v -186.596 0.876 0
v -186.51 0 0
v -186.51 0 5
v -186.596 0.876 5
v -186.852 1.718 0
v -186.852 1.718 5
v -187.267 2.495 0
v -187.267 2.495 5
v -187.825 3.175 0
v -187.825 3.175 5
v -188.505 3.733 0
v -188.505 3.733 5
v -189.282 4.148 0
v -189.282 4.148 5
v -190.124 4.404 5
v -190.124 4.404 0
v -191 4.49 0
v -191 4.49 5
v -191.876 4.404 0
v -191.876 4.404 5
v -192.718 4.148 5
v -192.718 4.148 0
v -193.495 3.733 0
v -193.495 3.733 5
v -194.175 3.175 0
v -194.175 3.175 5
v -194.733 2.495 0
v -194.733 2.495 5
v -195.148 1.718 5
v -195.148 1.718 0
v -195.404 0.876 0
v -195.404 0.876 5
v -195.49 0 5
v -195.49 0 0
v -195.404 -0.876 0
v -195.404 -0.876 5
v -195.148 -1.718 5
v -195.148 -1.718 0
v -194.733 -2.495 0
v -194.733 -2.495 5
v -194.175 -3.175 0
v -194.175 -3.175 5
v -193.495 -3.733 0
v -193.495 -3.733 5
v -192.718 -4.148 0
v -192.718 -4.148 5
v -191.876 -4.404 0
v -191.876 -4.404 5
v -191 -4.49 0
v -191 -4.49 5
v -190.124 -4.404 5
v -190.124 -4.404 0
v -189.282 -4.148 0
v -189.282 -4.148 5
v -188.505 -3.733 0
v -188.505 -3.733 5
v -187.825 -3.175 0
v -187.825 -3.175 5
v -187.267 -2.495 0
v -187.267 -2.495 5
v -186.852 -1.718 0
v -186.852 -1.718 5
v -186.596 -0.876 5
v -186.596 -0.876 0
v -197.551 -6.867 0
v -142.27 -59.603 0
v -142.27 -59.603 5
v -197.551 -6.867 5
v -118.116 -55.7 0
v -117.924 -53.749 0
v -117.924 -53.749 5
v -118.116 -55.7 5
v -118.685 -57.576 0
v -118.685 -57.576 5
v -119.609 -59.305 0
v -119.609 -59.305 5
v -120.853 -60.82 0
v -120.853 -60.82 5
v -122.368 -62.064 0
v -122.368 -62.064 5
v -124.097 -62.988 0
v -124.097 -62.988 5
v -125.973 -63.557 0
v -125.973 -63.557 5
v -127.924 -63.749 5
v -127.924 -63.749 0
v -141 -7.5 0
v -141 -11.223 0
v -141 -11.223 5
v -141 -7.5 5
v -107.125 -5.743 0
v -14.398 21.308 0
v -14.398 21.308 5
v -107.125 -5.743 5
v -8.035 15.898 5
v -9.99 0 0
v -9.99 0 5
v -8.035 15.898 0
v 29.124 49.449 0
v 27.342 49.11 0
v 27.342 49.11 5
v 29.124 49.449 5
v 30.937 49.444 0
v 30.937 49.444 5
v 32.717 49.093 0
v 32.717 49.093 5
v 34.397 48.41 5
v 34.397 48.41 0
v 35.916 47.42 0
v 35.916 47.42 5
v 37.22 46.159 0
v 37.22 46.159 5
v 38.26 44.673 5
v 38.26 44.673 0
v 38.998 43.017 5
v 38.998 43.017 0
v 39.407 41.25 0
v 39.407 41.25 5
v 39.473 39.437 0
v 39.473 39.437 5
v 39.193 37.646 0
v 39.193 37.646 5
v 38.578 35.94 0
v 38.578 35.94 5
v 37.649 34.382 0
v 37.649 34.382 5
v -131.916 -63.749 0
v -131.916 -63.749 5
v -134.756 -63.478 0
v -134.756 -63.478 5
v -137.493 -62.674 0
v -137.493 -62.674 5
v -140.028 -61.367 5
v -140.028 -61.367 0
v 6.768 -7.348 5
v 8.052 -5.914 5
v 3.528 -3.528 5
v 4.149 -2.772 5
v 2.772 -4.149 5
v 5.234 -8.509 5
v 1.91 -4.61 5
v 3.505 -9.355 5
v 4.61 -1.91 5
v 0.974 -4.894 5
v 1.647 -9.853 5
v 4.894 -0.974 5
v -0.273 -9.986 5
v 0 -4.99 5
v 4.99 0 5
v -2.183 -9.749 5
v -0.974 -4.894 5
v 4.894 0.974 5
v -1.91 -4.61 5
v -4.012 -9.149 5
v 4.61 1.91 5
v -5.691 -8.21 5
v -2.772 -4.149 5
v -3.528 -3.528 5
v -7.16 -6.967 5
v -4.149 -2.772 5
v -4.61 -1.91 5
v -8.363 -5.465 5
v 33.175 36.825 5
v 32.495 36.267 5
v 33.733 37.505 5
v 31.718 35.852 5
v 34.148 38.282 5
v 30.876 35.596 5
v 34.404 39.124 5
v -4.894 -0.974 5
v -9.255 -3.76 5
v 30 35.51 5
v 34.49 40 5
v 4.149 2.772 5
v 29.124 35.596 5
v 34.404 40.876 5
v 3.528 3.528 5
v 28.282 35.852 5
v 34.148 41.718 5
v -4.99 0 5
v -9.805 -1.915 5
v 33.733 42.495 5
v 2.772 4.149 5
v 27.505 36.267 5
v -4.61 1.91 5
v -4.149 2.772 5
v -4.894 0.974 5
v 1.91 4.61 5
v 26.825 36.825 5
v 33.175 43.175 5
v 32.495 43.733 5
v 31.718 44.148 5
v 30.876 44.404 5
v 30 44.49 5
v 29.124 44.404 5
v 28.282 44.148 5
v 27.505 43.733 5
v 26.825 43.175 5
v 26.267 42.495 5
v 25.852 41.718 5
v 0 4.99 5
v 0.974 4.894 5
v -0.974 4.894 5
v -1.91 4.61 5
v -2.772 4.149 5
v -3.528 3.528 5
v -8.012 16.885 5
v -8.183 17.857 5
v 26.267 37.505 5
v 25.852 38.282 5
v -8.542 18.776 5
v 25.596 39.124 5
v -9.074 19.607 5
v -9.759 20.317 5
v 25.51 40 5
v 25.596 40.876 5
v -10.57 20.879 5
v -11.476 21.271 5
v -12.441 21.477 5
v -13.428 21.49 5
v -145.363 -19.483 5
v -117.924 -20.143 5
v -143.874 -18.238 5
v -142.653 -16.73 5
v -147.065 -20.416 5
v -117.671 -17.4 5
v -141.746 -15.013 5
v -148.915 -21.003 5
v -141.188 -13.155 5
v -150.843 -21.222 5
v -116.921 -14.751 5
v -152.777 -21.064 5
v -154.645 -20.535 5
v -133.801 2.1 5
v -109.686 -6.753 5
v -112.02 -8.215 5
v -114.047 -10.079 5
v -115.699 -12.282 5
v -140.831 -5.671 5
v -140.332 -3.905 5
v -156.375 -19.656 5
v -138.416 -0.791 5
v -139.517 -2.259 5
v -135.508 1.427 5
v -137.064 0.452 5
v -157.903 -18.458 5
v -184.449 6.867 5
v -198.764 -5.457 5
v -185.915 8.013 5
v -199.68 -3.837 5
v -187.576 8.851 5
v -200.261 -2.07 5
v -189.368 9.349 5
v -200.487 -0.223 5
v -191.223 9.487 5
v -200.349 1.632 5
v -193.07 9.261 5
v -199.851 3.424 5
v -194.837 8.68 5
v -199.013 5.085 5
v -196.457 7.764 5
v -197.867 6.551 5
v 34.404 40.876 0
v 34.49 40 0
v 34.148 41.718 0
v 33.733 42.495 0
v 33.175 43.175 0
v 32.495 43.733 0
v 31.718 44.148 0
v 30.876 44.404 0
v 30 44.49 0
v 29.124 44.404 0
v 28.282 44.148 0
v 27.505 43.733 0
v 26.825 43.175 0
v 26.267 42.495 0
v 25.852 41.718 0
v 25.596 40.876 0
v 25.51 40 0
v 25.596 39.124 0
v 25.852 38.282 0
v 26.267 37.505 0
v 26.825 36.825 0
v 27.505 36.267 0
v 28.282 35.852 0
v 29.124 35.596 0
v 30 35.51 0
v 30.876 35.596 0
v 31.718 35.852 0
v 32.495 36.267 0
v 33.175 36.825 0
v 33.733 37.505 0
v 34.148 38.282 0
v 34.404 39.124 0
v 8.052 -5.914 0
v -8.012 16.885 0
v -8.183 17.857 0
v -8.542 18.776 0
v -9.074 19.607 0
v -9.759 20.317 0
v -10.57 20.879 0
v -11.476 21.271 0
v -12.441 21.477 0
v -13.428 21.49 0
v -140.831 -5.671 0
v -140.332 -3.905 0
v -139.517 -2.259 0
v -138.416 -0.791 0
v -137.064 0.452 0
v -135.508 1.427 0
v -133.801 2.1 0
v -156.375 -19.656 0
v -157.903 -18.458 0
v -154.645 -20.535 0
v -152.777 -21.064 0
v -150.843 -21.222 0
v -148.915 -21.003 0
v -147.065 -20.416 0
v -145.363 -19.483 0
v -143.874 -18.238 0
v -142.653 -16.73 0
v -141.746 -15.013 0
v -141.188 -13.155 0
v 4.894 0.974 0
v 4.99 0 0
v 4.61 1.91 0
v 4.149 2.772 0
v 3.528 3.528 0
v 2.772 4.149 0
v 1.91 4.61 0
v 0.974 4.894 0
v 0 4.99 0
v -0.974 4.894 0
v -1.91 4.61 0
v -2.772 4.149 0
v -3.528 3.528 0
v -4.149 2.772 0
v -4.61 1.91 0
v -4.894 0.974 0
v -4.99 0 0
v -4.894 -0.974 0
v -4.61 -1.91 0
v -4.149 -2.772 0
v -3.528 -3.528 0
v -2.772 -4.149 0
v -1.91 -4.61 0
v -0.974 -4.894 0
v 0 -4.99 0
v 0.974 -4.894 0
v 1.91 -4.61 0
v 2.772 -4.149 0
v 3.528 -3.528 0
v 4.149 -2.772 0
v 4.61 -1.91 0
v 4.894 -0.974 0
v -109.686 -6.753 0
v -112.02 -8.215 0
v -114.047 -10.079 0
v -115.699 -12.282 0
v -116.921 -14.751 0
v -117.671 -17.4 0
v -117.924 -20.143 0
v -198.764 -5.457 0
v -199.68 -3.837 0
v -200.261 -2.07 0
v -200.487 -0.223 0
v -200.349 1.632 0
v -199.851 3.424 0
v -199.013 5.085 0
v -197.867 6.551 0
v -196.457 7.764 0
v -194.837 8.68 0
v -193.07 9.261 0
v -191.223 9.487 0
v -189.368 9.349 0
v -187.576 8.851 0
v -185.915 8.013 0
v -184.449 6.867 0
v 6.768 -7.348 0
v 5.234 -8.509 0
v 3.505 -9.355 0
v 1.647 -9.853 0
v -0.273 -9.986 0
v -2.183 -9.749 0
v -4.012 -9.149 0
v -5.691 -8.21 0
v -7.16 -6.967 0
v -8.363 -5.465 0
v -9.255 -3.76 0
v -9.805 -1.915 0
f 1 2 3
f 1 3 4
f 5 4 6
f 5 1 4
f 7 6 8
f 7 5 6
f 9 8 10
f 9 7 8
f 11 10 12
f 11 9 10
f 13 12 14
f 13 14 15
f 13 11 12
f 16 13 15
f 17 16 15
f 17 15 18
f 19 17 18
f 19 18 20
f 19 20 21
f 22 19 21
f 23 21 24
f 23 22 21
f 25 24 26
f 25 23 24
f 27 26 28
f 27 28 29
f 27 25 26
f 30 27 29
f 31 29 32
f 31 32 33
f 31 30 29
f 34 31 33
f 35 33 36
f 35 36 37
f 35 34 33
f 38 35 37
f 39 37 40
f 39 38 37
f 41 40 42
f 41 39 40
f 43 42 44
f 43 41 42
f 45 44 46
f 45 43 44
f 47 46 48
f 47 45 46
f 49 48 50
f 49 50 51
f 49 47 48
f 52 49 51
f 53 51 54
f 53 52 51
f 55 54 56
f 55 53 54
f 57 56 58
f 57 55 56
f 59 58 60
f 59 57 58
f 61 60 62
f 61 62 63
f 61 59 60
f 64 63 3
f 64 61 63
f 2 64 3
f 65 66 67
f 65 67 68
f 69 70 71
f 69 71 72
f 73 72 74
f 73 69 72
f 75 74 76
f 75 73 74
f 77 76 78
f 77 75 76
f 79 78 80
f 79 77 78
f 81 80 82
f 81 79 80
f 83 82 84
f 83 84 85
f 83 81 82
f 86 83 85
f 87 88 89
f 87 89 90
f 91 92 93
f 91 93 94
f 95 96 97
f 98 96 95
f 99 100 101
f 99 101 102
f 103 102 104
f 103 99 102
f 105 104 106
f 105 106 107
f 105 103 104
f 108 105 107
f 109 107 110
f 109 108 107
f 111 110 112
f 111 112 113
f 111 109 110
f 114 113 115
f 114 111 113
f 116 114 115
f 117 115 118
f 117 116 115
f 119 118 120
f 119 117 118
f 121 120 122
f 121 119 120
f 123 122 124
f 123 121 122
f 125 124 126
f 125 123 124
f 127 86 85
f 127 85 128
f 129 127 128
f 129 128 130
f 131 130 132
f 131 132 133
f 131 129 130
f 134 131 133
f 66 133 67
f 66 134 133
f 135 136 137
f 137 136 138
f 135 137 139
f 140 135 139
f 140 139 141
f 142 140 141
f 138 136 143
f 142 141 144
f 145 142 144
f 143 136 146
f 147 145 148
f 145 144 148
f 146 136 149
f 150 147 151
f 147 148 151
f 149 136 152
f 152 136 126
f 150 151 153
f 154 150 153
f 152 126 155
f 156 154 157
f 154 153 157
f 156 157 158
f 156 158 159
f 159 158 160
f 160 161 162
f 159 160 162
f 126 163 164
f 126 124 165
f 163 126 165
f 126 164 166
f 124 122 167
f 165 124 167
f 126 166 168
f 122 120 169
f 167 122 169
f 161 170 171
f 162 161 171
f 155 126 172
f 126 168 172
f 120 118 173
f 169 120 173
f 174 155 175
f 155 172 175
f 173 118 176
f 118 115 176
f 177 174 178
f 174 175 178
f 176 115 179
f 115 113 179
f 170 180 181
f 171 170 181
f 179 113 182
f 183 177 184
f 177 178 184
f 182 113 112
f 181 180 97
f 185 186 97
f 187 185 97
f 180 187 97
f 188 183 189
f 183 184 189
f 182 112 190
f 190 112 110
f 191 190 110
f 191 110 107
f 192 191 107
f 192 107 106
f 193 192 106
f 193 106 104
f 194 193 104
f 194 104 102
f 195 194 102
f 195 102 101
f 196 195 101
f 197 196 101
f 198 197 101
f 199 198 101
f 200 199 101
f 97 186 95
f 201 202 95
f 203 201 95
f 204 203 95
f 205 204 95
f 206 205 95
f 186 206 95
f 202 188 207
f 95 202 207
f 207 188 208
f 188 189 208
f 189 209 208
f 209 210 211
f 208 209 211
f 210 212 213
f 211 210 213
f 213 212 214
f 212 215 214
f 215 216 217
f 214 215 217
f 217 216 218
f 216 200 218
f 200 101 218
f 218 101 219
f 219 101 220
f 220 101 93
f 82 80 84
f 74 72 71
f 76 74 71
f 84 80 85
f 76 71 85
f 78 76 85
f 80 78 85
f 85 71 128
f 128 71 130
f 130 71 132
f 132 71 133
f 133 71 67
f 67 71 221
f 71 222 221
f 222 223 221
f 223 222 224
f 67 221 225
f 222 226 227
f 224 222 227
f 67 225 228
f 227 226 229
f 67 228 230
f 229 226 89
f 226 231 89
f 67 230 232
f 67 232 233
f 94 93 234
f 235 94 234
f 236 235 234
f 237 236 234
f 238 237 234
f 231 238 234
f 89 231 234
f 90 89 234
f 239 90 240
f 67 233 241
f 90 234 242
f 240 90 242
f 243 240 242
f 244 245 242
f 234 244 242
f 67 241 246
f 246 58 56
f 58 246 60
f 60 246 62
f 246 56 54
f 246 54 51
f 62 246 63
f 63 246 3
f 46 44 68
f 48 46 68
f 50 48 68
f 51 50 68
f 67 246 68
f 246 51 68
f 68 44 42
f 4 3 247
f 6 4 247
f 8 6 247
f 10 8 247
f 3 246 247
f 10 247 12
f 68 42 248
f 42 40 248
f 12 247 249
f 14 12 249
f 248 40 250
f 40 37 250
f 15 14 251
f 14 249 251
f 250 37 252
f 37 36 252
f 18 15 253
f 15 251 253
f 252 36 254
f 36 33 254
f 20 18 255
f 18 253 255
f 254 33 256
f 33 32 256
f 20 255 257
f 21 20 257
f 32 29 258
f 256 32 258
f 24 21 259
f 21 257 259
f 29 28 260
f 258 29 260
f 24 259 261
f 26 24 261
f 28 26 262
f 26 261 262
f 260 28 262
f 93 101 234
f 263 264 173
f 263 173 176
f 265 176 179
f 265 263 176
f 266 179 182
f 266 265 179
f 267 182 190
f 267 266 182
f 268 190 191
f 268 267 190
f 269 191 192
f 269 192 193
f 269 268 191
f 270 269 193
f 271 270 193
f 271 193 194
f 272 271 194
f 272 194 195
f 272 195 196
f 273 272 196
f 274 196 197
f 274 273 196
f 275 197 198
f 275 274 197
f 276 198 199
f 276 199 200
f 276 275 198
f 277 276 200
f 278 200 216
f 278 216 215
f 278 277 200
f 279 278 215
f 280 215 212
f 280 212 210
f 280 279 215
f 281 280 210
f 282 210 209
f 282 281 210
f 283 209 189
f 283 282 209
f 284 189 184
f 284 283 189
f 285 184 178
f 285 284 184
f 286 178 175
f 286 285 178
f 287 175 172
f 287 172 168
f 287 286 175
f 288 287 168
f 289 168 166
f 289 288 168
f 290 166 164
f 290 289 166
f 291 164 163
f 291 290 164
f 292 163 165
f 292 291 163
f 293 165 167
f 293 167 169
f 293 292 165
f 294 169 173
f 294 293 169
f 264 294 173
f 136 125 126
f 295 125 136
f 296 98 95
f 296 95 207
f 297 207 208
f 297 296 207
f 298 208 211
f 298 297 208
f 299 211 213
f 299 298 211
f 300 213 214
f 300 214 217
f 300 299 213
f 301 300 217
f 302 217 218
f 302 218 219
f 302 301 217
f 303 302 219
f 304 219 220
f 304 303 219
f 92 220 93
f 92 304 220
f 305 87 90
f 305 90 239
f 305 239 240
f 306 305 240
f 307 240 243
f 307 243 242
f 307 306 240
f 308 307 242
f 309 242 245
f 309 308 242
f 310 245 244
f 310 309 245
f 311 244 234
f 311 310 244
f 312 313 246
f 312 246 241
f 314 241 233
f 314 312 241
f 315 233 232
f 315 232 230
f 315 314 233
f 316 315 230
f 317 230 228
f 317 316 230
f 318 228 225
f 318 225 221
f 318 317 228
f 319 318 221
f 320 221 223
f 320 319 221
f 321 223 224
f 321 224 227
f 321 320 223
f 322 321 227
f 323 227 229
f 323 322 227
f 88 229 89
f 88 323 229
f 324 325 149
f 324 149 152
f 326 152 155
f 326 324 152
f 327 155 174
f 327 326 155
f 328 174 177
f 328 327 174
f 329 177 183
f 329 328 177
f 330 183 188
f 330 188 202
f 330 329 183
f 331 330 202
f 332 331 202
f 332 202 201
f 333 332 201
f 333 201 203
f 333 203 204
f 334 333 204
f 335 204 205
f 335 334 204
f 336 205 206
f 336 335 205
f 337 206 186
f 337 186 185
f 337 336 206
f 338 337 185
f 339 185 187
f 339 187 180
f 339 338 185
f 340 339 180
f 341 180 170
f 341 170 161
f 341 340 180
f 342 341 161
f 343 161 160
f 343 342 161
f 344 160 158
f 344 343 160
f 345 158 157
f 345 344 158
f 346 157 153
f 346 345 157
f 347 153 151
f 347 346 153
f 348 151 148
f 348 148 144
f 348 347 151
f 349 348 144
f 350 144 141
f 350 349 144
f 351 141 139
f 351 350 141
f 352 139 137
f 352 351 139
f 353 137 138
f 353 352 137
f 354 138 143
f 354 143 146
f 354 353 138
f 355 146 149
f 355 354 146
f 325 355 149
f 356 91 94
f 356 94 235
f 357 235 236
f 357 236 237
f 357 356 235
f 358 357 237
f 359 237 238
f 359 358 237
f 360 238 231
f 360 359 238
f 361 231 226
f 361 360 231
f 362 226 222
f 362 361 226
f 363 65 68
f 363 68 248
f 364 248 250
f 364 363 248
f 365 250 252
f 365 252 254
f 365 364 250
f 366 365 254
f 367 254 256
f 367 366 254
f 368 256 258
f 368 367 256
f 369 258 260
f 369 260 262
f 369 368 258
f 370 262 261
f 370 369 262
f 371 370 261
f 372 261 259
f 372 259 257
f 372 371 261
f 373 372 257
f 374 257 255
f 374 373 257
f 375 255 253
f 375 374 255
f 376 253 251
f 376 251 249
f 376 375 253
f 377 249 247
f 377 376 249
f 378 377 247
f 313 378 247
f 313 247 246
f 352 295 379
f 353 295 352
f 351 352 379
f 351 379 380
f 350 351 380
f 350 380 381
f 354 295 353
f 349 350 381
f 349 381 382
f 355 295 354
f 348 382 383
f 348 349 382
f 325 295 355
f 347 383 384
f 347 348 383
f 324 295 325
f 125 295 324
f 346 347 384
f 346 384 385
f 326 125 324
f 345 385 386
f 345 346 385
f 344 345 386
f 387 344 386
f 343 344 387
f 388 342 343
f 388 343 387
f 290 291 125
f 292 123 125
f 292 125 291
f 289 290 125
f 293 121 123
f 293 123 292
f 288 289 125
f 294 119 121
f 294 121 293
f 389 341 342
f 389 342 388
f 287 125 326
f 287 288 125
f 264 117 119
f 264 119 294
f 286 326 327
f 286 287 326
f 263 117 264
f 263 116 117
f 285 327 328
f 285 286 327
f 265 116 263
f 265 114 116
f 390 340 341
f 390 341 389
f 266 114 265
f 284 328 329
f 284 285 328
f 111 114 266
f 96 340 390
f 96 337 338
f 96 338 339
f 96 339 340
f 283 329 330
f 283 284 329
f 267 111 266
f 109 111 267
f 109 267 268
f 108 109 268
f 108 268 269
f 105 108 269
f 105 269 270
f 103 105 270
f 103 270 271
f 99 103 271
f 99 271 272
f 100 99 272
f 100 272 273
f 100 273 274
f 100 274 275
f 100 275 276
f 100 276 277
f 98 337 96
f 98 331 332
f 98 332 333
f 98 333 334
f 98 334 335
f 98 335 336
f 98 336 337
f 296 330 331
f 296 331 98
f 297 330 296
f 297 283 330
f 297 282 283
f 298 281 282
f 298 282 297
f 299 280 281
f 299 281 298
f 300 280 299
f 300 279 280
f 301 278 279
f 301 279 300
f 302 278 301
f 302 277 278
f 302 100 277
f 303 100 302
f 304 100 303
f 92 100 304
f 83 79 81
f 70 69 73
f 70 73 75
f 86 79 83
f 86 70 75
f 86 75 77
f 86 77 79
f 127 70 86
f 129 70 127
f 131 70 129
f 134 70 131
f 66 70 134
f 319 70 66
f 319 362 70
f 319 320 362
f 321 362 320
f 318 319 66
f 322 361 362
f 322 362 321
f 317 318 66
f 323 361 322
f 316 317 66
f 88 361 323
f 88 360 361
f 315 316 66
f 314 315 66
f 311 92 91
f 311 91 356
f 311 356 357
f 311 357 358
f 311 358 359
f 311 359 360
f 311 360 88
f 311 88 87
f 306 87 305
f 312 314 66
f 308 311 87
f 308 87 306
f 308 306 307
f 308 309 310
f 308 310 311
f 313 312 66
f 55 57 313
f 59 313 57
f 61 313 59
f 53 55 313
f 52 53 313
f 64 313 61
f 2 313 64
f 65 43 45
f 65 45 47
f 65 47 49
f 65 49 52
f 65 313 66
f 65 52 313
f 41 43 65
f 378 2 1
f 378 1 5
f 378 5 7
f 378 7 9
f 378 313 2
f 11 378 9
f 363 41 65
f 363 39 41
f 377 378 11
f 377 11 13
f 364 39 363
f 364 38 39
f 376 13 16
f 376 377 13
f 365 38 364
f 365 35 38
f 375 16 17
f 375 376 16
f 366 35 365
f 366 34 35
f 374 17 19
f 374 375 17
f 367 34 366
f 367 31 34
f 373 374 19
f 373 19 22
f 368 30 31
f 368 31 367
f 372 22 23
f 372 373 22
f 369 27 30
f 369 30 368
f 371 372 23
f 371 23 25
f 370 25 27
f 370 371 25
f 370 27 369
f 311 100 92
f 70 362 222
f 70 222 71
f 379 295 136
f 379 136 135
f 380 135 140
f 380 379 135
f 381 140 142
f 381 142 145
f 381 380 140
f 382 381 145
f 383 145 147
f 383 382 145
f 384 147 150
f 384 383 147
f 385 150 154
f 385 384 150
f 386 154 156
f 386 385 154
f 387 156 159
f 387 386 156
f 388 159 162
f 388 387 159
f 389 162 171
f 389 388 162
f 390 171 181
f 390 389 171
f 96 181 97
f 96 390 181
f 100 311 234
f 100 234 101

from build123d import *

# Parameters (mm, degrees)
SKETCH1_R           = 4.99
SKETCH1_R_2         = 4.49
BOSS_EXTRUDE1_DEPTH = 5


with BuildPart() as part:
    # Sketch1 → Boss-Extrude1 (new body)
    with BuildSketch(Plane.XY):
        with BuildLine():
            Line((-133.800547442, 2.100285816), (27.342280478, 49.110248457))
            ThreePointArc((27.342280478, 49.110248457), (37.775341878, 45.440970381), (37.648560391, 34.382204707))
            Line((37.648560391, 34.382204707), (8.05154039, -5.913780293))
            ThreePointArc((8.05154039, -5.913780293), (-3.111688569, -9.493023451), (-9.99, 0))
            Line((-9.99, 0), (-8.035082933, 15.898008925))
            ThreePointArc((-8.035082933, 15.898008925), (-9.75887393, 20.317439667), (-14.397978323, 21.308163599))
            Line((-14.397978323, 21.308163599), (-107.124555833, -5.742825892))
            ThreePointArc((-107.124555833, -5.742825892), (-114.923991281, -11.142928518), (-117.92373467, -20.142586361))
            Line((-117.92373467, -20.142586361), (-117.92373467, -53.749229456))
            ThreePointArc((-117.92373467, -53.749229456), (-120.852666858, -60.820297268), (-127.92373467, -63.749229456))
            Line((-127.92373467, -63.749229456), (-131.916457627, -63.749229456))
            ThreePointArc((-131.916457627, -63.749229456), (-137.493140936, -62.674049142), (-142.270365562, -59.602643226))
            Line((-142.270365562, -59.602643226), (-197.550572421, -6.866593112))
            ThreePointArc((-197.550572421, -6.866593112), (-197.866593112, 6.550572421), (-184.449427579, 6.866593112))
            Line((-184.449427579, 6.866593112), (-157.90260529, -18.4584668))
            ThreePointArc((-157.90260529, -18.4584668), (-147.064650772, -20.415954294), (-141, -11.22285762))
            Line((-141, -11.22285762), (-141, -7.499554497))
            ThreePointArc((-141, -7.499554497), (-139.000171074, -1.499782602), (-133.800547442, 2.100285816))
        make_face()
        Circle(SKETCH1_R, mode=Mode.SUBTRACT)
        with Locations((-191, 0)):
            Circle(SKETCH1_R_2, mode=Mode.SUBTRACT)
        with Locations((30, 40)):
            Circle(SKETCH1_R_2, mode=Mode.SUBTRACT)
    extrude(amount=BOSS_EXTRUDE1_DEPTH)


solid = part.part
